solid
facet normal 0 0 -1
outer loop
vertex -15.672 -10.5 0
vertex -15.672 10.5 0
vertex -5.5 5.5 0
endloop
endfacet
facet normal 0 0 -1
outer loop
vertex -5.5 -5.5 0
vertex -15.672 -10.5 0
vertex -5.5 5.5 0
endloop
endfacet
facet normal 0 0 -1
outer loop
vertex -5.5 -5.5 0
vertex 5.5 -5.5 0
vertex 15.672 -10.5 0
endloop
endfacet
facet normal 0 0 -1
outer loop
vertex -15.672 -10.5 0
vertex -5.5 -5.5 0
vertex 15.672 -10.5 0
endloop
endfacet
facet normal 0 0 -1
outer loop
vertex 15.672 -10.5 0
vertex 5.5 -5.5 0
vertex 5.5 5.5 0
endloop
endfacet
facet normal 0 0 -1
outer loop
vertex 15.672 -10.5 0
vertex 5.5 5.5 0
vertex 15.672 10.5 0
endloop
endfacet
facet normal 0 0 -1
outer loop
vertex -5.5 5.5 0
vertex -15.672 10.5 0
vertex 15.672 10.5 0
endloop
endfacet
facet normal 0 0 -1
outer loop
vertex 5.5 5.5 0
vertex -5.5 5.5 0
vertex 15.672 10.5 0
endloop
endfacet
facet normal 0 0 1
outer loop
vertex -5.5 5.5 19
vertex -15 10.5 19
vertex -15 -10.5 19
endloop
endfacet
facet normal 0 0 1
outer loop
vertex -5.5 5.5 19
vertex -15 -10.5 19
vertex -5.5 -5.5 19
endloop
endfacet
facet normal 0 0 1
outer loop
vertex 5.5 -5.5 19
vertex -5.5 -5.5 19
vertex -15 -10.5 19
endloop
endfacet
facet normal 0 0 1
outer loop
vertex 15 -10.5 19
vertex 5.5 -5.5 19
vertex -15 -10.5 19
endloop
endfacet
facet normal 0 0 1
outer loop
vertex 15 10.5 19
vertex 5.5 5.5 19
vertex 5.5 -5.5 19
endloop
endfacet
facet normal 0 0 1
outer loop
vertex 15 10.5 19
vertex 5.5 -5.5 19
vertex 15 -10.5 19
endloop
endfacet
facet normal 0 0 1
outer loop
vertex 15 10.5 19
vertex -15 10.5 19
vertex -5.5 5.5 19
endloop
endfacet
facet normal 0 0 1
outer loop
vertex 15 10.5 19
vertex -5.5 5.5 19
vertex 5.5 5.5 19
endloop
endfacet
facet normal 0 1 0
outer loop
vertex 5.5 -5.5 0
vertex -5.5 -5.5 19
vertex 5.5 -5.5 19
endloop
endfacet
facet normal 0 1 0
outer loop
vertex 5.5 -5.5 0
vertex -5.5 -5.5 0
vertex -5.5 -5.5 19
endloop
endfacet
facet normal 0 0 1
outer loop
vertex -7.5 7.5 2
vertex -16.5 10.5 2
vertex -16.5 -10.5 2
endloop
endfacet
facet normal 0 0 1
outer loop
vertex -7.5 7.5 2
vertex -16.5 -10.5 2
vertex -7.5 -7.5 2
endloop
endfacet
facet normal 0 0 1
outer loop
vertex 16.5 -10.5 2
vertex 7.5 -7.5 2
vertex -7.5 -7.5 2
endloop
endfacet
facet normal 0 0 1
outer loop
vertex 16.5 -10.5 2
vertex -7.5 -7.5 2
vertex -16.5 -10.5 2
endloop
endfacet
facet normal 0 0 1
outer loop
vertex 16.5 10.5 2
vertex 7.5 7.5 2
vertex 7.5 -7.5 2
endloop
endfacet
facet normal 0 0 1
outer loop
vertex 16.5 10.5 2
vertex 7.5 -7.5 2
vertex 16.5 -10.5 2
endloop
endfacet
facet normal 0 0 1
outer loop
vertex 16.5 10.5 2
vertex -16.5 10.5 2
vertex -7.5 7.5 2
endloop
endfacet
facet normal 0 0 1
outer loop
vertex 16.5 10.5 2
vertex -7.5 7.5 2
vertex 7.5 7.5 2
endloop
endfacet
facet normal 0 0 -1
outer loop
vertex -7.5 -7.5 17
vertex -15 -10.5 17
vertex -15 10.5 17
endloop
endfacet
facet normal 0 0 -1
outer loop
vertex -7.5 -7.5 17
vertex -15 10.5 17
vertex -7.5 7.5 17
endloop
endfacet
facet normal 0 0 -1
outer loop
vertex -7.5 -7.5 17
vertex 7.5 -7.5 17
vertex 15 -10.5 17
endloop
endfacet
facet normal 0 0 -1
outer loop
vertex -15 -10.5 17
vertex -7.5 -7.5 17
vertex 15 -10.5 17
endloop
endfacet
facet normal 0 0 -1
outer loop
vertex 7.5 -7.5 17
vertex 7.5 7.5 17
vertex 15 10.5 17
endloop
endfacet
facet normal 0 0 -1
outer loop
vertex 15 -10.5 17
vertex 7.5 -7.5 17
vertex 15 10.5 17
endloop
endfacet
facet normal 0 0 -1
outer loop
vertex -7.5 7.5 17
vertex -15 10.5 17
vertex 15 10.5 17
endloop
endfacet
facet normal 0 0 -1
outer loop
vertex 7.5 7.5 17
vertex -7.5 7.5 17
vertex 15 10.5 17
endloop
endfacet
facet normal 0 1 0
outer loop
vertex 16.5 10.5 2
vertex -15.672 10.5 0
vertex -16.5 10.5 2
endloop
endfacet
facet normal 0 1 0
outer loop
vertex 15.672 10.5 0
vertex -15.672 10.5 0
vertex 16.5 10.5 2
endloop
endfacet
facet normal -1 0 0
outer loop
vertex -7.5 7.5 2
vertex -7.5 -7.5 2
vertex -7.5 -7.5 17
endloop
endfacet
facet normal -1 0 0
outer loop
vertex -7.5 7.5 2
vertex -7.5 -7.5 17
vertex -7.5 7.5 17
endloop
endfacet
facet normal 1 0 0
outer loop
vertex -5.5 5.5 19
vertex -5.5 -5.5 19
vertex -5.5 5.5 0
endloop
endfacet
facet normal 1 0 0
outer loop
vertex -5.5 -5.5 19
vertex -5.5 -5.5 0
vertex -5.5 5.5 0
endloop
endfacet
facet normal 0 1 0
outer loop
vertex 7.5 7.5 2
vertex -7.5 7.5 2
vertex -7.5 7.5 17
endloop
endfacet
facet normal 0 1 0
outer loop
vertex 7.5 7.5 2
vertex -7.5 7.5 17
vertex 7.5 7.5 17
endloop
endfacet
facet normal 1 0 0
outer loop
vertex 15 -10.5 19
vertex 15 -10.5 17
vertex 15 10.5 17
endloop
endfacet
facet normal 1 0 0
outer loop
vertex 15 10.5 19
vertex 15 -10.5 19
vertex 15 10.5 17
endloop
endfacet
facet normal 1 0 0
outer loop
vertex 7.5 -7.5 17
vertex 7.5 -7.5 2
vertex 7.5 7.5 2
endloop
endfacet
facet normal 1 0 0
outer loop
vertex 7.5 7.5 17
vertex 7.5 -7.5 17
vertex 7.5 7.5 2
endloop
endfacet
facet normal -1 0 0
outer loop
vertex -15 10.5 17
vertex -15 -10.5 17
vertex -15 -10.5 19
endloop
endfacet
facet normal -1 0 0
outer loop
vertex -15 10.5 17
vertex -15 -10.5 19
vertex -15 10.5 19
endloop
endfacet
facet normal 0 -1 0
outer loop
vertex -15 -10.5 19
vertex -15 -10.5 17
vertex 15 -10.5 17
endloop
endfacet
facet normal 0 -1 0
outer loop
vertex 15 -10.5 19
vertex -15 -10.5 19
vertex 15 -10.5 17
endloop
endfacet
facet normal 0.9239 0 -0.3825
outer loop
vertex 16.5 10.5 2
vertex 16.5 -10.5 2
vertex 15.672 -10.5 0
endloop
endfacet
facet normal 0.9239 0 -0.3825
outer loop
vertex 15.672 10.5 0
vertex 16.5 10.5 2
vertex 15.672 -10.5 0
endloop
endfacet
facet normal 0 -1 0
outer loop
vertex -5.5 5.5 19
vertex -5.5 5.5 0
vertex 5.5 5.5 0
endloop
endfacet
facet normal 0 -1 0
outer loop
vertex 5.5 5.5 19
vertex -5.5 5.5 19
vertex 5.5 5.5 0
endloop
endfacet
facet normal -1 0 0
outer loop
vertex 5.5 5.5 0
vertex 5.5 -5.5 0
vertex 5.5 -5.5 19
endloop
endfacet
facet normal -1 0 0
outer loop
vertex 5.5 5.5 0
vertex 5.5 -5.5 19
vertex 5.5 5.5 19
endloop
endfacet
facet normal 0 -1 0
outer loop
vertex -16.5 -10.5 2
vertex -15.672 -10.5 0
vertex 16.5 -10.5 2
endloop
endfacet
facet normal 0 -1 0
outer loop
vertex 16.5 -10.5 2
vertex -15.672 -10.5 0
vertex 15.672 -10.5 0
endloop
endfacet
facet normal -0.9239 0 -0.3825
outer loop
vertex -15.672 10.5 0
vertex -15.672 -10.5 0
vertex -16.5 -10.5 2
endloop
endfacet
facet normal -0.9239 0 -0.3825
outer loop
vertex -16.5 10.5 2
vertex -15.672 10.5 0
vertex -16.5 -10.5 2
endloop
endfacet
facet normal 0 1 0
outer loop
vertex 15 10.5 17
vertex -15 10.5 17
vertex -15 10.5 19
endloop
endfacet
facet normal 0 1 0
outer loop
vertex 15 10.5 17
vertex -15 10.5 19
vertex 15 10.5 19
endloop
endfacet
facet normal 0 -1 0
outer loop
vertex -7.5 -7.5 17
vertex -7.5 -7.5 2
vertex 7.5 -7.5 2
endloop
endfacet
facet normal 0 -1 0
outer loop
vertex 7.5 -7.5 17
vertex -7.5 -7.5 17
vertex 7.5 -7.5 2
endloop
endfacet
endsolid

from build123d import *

# Parameters (mm, degrees)
F0_W     = 33
F0_H     = 21
F0_W_2   = 15
F0_H_2   = 15
F0_W_3   = 11
F0_H_3   = 11
F1_DEPTH = 2
F2_DEPTH = 17
F3_W     = 30
F3_H     = 21
F3_W_2   = 15
F3_H_2   = 15
F3_W_3   = 11
F3_H_3   = 11
F4_DEPTH = 2
F6_DEPTH = 25


with BuildPart() as f1:
    # F0 (on Top) → F1 (new body)
    with BuildSketch(Plane.XY):
        Rectangle(F0_W, F0_H)
        Rectangle(F0_W_2, F0_H_2, mode=Mode.SUBTRACT)
        Rectangle(F0_W_2, F0_H_2)
        Rectangle(F0_W_3, F0_H_3, mode=Mode.SUBTRACT)
    extrude(amount=F1_DEPTH)

    # F0 (on Top) → F2 (join)
    with BuildSketch(Plane.XY):
        Rectangle(F0_W_2, F0_H_2)
        Rectangle(F0_W_3, F0_H_3, mode=Mode.SUBTRACT)
    extrude(amount=F2_DEPTH)

    # F3 (on face) → F4 (join)
    with BuildSketch(Plane.XY.offset(17)):
        Rectangle(F3_W, F3_H)
        Rectangle(F3_W_2, F3_H_2, mode=Mode.SUBTRACT)
        Rectangle(F3_W_2, F3_H_2)
        Rectangle(F3_W_3, F3_H_3, mode=Mode.SUBTRACT)
    extrude(amount=F4_DEPTH)

    # F5 (on face) → F6 (cut)
    with BuildSketch(Plane.XZ.offset(10.5)):
        Polygon((-15.671573, 0), (-16.5, 2), (-16.5, 0), align=None)
        Polygon((16.5, 0), (16.5, 2), (15.671573, 0), align=None)
    extrude(amount=-F6_DEPTH, mode=Mode.SUBTRACT)


solid = f1.part
